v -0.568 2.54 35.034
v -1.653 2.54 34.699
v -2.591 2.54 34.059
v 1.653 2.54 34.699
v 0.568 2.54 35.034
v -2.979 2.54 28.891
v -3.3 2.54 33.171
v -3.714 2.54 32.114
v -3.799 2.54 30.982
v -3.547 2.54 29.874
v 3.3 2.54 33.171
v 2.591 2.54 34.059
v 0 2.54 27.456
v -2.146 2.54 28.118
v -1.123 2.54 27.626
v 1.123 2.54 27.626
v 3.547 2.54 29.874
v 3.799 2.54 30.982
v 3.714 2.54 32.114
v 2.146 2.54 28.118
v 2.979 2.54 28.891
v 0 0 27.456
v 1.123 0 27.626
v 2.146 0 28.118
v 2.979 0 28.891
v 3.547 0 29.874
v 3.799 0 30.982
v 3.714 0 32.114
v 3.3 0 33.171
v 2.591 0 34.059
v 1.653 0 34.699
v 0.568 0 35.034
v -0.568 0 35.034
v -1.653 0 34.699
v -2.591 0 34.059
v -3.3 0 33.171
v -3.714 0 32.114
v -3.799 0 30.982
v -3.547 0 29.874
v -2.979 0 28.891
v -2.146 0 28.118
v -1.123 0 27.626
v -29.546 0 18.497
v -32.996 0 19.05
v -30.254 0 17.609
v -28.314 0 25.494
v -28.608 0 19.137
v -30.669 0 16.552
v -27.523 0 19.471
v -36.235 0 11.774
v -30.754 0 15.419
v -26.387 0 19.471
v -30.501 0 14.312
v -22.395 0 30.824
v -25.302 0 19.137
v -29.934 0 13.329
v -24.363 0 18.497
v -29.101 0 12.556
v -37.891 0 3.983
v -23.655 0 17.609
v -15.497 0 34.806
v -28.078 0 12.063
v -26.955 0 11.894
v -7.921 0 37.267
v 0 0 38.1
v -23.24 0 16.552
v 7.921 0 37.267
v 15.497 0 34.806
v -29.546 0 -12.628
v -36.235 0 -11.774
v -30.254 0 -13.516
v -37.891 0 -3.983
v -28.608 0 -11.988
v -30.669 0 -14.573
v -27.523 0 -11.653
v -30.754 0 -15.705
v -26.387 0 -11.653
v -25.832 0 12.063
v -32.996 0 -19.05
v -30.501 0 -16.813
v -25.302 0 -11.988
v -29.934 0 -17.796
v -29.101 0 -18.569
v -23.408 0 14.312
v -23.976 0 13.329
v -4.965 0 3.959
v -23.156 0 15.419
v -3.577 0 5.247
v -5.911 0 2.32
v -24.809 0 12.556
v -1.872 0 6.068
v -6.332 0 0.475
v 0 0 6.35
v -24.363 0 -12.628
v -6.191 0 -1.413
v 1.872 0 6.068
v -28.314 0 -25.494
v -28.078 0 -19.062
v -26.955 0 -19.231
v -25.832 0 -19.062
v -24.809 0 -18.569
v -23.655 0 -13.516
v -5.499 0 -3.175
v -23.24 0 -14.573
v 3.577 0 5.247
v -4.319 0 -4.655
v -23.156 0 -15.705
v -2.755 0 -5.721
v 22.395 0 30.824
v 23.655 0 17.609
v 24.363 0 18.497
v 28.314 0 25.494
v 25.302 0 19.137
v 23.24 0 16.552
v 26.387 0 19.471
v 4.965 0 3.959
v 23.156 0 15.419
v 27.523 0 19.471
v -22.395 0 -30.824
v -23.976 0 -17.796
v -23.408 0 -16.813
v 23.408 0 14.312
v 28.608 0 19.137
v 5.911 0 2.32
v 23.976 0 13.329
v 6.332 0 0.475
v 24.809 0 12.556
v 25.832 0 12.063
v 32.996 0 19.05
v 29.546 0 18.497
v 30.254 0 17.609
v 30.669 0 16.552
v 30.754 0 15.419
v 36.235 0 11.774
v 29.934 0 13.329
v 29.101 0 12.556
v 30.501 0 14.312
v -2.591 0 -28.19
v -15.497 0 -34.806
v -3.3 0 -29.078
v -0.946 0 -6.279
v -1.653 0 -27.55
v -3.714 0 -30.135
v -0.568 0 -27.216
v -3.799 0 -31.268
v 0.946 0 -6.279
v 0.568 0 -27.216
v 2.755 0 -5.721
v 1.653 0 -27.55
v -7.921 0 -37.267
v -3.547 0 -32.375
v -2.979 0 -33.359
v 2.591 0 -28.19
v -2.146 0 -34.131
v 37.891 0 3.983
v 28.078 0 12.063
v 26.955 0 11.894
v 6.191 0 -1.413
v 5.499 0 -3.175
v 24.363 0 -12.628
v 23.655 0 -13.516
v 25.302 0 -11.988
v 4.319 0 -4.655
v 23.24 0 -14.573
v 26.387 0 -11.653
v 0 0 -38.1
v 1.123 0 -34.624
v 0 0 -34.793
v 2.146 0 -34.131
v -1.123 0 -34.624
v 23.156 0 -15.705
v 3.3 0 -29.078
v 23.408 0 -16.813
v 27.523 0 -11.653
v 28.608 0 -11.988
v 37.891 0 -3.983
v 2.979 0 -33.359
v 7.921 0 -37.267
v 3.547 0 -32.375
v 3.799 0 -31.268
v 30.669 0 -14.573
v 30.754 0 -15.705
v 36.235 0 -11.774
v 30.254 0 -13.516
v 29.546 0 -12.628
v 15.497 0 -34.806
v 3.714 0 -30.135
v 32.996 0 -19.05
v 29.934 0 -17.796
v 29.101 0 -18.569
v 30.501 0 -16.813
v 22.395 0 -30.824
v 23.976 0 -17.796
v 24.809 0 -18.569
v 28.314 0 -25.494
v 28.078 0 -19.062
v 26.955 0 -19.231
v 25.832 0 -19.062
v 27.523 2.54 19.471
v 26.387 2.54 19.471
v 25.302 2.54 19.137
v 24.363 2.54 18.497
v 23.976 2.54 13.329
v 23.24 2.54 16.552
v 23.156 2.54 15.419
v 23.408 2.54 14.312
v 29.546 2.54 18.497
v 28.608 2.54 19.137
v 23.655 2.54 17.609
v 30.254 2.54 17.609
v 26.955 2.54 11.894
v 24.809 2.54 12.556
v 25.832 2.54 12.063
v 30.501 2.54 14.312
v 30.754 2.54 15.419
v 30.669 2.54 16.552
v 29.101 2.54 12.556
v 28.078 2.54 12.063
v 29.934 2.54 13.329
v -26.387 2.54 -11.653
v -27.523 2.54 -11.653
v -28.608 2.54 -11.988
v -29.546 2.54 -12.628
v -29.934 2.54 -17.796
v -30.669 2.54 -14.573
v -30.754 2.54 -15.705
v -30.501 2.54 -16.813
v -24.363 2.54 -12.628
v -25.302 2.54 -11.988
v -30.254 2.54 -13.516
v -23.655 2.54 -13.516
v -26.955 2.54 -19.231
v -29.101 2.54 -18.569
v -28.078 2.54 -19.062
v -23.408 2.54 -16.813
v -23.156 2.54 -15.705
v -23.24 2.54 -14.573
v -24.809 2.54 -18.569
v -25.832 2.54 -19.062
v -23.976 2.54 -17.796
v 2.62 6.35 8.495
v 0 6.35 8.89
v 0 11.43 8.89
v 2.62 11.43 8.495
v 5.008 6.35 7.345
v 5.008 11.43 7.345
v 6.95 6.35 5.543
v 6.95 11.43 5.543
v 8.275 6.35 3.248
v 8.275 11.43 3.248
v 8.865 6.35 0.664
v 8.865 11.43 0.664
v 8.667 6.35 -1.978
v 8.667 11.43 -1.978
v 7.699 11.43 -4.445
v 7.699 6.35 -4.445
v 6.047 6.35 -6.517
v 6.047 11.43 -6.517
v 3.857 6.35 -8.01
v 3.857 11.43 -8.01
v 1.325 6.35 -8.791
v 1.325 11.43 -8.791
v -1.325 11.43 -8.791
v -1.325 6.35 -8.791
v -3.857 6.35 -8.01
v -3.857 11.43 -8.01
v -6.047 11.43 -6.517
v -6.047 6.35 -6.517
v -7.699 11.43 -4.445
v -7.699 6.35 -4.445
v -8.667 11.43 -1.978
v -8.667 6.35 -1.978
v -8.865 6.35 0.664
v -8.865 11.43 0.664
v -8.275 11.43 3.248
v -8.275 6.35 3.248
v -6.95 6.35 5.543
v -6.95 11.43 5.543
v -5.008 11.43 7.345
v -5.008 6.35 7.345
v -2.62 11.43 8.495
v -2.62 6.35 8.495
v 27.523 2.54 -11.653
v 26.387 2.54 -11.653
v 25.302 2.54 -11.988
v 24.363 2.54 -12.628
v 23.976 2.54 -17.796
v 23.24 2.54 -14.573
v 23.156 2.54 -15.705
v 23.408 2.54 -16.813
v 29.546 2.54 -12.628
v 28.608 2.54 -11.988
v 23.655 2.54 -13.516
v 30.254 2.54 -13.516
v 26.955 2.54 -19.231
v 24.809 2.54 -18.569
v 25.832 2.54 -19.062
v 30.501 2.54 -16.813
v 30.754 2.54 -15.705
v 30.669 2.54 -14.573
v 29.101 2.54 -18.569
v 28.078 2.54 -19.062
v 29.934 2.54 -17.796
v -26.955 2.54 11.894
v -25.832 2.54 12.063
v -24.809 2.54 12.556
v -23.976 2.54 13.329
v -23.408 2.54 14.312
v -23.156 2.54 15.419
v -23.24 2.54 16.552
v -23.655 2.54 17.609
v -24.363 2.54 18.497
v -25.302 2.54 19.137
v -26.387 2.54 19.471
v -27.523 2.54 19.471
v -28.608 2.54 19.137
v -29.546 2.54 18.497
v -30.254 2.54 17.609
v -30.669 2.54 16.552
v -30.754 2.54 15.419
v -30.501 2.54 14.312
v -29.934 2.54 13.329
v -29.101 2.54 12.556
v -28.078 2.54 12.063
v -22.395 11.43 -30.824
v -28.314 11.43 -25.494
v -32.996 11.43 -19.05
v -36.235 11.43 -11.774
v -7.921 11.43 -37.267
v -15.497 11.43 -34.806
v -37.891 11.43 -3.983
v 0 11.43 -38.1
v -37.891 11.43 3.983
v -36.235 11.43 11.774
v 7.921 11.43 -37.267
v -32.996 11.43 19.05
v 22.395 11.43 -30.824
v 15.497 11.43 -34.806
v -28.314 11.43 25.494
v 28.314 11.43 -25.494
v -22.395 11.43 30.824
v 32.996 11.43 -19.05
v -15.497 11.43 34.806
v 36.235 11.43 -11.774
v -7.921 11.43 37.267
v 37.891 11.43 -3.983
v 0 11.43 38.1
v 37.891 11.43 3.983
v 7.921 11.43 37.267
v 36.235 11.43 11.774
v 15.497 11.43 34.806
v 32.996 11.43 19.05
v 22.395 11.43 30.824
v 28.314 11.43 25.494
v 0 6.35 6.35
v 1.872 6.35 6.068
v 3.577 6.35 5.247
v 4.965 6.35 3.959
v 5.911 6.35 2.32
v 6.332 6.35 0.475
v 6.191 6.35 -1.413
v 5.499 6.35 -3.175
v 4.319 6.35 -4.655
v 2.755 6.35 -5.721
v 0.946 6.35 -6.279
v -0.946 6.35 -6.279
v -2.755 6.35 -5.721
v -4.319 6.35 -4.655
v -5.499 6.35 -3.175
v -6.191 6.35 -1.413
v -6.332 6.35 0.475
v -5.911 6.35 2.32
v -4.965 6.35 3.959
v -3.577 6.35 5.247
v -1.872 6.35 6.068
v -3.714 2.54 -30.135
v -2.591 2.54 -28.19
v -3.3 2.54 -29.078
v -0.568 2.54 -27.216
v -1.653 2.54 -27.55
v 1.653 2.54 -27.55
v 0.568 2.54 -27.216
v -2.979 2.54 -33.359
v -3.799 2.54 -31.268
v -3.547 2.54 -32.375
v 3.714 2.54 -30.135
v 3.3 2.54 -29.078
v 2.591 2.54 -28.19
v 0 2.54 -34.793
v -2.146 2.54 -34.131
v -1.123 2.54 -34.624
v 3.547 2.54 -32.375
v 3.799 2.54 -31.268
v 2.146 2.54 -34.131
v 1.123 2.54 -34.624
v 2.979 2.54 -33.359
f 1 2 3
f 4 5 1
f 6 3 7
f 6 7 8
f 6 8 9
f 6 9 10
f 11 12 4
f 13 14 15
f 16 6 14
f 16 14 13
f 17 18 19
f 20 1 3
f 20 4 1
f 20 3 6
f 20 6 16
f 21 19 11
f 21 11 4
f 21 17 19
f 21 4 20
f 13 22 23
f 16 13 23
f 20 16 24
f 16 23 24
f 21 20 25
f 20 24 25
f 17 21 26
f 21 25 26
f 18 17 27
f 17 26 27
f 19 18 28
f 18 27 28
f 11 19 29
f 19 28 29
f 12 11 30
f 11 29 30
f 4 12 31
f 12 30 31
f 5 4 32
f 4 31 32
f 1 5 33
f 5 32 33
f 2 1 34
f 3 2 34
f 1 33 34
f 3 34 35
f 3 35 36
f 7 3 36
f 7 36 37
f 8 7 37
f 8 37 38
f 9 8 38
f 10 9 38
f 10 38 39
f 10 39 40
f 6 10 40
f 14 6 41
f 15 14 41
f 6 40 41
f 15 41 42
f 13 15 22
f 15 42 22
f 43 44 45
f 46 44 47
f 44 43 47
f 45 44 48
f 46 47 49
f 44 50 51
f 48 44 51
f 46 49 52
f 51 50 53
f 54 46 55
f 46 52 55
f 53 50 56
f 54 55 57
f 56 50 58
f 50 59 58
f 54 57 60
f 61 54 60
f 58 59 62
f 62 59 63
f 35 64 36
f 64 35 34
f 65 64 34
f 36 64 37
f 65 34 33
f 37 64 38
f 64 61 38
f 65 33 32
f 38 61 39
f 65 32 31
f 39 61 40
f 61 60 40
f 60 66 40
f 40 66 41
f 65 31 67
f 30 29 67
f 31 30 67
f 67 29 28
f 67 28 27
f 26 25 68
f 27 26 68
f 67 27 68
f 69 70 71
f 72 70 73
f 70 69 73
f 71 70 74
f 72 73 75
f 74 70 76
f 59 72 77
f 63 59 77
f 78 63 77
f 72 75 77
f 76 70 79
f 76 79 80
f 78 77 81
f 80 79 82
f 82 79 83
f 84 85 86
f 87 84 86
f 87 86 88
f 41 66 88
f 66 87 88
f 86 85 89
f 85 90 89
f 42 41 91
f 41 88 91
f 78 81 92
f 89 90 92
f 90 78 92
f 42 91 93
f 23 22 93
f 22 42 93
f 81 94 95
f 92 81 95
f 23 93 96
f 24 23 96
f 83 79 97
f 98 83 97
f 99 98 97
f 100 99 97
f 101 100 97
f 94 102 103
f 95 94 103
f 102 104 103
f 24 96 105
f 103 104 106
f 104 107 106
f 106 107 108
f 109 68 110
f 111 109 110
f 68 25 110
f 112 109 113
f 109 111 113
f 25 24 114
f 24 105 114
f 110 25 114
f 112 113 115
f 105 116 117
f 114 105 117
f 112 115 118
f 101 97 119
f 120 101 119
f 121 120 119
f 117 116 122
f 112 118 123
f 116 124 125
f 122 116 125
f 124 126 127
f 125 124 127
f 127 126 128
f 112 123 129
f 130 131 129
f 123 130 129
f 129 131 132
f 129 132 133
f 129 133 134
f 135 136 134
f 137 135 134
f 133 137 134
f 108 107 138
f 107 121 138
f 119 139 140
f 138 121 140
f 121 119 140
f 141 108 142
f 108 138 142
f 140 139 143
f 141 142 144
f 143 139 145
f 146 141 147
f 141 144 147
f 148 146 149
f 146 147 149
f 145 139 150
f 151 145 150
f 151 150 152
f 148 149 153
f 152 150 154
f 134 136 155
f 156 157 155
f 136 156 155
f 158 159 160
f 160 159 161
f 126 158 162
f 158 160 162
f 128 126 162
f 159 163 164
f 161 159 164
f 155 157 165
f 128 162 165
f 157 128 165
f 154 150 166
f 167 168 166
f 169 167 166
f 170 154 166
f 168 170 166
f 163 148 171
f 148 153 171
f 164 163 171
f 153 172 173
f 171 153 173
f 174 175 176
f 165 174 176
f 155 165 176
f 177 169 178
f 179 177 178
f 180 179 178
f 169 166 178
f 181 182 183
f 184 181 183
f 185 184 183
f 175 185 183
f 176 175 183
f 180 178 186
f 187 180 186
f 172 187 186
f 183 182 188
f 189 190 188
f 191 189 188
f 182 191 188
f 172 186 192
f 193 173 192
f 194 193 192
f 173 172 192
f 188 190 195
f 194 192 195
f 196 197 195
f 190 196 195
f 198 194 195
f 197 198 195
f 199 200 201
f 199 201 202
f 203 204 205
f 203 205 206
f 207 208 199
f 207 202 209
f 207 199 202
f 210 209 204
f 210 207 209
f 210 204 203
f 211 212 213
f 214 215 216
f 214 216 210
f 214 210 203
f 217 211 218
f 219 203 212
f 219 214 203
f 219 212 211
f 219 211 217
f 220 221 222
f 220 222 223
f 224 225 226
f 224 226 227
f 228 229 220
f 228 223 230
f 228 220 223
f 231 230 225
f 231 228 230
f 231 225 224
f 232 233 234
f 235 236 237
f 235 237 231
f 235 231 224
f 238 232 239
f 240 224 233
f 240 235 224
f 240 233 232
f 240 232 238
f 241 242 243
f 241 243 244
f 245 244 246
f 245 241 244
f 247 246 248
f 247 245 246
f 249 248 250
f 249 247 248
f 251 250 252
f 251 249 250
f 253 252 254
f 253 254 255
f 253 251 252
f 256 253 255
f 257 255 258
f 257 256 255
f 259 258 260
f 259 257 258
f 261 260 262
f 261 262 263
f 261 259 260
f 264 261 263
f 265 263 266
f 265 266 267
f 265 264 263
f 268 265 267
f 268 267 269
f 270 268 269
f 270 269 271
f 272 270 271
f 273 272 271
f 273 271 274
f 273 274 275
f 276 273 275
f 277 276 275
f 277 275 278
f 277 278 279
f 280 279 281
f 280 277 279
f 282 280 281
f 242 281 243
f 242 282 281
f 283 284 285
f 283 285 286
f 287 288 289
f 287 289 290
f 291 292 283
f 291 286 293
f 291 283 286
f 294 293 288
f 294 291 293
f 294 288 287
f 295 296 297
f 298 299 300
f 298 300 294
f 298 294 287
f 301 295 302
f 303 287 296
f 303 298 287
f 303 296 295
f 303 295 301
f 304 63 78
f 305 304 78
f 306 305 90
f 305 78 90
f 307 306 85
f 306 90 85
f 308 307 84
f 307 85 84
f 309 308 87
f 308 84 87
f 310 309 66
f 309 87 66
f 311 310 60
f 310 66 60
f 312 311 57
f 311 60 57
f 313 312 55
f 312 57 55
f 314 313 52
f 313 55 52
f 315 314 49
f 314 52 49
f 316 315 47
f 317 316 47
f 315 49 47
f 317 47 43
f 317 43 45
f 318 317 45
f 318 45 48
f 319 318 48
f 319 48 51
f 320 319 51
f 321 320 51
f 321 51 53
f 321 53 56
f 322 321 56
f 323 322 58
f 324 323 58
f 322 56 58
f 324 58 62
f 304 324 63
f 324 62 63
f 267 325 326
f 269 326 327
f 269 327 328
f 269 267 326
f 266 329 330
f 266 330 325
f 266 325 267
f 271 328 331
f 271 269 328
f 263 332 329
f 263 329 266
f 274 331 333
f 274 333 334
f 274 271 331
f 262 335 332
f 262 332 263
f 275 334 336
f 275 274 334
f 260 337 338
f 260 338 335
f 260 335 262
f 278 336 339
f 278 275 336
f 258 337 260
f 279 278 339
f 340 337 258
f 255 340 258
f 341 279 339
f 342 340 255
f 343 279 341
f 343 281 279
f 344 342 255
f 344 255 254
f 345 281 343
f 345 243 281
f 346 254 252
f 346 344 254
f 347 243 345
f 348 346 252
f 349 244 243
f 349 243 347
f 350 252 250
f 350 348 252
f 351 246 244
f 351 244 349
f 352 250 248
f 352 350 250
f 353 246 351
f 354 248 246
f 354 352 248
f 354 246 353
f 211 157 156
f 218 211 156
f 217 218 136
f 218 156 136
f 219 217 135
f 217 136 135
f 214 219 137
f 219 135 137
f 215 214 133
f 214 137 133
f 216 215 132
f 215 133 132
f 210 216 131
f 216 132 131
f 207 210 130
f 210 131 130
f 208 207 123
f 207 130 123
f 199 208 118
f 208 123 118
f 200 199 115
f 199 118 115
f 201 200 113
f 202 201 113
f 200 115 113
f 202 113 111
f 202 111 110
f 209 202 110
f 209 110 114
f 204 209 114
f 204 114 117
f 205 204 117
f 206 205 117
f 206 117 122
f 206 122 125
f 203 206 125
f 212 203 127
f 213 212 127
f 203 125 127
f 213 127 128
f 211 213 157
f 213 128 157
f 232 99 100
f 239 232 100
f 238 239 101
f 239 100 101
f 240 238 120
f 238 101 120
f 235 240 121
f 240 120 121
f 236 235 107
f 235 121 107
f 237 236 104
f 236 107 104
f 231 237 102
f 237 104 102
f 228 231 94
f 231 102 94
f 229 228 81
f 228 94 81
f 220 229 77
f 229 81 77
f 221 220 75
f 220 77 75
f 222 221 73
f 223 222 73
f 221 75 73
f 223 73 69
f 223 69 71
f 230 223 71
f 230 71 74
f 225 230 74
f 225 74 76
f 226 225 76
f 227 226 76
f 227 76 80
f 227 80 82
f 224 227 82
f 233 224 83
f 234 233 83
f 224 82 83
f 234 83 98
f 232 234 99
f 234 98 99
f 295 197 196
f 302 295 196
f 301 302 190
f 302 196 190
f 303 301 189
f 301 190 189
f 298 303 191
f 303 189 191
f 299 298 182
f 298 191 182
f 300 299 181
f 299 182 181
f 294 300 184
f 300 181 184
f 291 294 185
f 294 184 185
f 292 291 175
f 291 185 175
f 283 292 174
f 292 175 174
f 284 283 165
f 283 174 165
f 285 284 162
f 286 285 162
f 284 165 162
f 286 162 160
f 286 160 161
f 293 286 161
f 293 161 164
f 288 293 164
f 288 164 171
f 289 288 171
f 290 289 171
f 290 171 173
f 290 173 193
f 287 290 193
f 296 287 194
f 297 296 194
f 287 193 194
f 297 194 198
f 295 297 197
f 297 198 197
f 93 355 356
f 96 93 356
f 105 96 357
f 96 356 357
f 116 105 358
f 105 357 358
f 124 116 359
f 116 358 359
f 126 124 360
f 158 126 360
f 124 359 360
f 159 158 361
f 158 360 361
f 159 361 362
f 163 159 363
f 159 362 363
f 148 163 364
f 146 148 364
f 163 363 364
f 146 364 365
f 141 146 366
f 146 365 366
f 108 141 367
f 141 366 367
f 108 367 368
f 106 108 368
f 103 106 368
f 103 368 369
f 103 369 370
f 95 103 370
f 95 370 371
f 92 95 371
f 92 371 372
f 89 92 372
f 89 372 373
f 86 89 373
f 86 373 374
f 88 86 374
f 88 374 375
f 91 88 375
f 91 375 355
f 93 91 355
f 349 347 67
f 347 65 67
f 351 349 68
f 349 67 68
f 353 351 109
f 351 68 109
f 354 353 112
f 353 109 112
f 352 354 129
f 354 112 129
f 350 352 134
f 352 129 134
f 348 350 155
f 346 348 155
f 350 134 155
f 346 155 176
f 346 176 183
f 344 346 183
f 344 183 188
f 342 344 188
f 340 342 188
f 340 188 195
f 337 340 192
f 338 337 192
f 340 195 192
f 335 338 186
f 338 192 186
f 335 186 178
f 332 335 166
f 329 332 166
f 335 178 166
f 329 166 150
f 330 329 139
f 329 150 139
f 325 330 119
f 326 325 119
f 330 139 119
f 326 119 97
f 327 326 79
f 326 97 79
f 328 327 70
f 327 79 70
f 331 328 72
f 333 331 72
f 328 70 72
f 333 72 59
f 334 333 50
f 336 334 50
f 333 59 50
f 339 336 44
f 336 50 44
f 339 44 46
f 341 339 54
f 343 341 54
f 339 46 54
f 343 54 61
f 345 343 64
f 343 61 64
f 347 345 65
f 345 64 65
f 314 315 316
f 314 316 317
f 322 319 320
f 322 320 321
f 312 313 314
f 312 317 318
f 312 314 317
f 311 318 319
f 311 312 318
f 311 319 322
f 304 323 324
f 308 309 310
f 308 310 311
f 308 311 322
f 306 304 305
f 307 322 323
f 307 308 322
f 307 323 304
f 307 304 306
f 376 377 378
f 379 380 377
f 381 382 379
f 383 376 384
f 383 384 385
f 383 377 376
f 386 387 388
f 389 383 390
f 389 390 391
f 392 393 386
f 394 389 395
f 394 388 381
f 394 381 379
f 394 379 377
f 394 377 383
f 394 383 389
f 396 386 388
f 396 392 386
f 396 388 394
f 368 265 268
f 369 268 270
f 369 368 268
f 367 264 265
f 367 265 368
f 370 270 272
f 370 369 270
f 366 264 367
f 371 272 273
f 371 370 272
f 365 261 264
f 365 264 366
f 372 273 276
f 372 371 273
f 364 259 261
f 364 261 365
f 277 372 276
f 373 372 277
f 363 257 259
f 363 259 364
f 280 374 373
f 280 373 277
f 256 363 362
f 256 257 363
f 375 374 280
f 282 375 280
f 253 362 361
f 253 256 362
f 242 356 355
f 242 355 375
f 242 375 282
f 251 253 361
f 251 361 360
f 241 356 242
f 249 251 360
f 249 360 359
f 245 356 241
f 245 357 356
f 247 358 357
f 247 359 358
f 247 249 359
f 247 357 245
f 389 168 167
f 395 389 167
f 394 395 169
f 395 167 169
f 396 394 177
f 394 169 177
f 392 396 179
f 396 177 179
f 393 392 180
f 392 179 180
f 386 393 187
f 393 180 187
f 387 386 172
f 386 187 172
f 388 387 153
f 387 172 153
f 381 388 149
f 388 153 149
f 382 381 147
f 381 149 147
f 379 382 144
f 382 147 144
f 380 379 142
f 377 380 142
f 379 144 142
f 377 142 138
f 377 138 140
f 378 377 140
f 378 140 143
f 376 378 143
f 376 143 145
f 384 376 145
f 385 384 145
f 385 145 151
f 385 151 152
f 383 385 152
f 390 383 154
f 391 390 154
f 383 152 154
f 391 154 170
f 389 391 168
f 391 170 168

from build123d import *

# Parameters (mm, degrees)
SKETCH1_R           = 38.1
SKETCH1_R_2         = 25.4
BOSS_EXTRUDE3_DEPTH = 6.35
SKETCH1_3_R         = 25.4
BOSS_EXTRUDE4_DEPTH = 6.35
SKETCH2_R           = 3.81
CUT_EXTRUDE1_DEPTH  = 2.54
SKETCH3_R           = 6.35
CUT_EXTRUDE2_DEPTH  = 55.254423783
SKETCH4_R           = 38.1
SKETCH4_R_2         = 8.89
BOSS_EXTRUDE5_DEPTH = 5.08


with BuildPart() as part:
    # Sketch1 → Boss-Extrude3 (new body)
    with BuildSketch(Plane(origin=(0, 0, 0), x_dir=(1, 0, 0), z_dir=(0, 1, 0))):
        Circle(SKETCH1_R)
        Circle(SKETCH1_R_2, mode=Mode.SUBTRACT)
    extrude(amount=BOSS_EXTRUDE3_DEPTH)

    # Sketch1<3> → Boss-Extrude4 (add)
    with BuildSketch(Plane(origin=(0, 0, 0), x_dir=(1, 0, 0), z_dir=(0, 1, 0))):
        Circle(SKETCH1_3_R)
    extrude(amount=BOSS_EXTRUDE4_DEPTH)

    # Sketch2 → Cut-Extrude1 (cut)
    with BuildSketch(Plane.XZ):
        with Locations((0, 31.266403726)):
            Circle(SKETCH2_R)
        with Locations((26.954852036, 15.704012647)):
            Circle(SKETCH2_R)
        with Locations((26.954852036, -15.420769511)):
            Circle(SKETCH2_R)
        with Locations((0, -30.98316059)):
            Circle(SKETCH2_R)
        with Locations((-26.954852036, -15.420769511)):
            Circle(SKETCH2_R)
        with Locations((-26.954852036, 15.704012647)):
            Circle(SKETCH2_R)
    extrude(amount=-CUT_EXTRUDE1_DEPTH, mode=Mode.SUBTRACT)

    # Sketch3 → Cut-Extrude2 (cut, through all)
    with BuildSketch(Plane(origin=(0, 6.35, 0), x_dir=(1, 0, 0), z_dir=(0, 1, 0))):
        Circle(SKETCH3_R)
    extrude(amount=-CUT_EXTRUDE2_DEPTH, mode=Mode.SUBTRACT)

    # Sketch4 → Boss-Extrude5 (add)
    with BuildSketch(Plane(origin=(0, 6.35, 0), x_dir=(1, 0, 0), z_dir=(0, 1, 0))):
        Circle(SKETCH4_R)
        Circle(SKETCH4_R_2, mode=Mode.SUBTRACT)
    extrude(amount=BOSS_EXTRUDE5_DEPTH)


solid = part.part
